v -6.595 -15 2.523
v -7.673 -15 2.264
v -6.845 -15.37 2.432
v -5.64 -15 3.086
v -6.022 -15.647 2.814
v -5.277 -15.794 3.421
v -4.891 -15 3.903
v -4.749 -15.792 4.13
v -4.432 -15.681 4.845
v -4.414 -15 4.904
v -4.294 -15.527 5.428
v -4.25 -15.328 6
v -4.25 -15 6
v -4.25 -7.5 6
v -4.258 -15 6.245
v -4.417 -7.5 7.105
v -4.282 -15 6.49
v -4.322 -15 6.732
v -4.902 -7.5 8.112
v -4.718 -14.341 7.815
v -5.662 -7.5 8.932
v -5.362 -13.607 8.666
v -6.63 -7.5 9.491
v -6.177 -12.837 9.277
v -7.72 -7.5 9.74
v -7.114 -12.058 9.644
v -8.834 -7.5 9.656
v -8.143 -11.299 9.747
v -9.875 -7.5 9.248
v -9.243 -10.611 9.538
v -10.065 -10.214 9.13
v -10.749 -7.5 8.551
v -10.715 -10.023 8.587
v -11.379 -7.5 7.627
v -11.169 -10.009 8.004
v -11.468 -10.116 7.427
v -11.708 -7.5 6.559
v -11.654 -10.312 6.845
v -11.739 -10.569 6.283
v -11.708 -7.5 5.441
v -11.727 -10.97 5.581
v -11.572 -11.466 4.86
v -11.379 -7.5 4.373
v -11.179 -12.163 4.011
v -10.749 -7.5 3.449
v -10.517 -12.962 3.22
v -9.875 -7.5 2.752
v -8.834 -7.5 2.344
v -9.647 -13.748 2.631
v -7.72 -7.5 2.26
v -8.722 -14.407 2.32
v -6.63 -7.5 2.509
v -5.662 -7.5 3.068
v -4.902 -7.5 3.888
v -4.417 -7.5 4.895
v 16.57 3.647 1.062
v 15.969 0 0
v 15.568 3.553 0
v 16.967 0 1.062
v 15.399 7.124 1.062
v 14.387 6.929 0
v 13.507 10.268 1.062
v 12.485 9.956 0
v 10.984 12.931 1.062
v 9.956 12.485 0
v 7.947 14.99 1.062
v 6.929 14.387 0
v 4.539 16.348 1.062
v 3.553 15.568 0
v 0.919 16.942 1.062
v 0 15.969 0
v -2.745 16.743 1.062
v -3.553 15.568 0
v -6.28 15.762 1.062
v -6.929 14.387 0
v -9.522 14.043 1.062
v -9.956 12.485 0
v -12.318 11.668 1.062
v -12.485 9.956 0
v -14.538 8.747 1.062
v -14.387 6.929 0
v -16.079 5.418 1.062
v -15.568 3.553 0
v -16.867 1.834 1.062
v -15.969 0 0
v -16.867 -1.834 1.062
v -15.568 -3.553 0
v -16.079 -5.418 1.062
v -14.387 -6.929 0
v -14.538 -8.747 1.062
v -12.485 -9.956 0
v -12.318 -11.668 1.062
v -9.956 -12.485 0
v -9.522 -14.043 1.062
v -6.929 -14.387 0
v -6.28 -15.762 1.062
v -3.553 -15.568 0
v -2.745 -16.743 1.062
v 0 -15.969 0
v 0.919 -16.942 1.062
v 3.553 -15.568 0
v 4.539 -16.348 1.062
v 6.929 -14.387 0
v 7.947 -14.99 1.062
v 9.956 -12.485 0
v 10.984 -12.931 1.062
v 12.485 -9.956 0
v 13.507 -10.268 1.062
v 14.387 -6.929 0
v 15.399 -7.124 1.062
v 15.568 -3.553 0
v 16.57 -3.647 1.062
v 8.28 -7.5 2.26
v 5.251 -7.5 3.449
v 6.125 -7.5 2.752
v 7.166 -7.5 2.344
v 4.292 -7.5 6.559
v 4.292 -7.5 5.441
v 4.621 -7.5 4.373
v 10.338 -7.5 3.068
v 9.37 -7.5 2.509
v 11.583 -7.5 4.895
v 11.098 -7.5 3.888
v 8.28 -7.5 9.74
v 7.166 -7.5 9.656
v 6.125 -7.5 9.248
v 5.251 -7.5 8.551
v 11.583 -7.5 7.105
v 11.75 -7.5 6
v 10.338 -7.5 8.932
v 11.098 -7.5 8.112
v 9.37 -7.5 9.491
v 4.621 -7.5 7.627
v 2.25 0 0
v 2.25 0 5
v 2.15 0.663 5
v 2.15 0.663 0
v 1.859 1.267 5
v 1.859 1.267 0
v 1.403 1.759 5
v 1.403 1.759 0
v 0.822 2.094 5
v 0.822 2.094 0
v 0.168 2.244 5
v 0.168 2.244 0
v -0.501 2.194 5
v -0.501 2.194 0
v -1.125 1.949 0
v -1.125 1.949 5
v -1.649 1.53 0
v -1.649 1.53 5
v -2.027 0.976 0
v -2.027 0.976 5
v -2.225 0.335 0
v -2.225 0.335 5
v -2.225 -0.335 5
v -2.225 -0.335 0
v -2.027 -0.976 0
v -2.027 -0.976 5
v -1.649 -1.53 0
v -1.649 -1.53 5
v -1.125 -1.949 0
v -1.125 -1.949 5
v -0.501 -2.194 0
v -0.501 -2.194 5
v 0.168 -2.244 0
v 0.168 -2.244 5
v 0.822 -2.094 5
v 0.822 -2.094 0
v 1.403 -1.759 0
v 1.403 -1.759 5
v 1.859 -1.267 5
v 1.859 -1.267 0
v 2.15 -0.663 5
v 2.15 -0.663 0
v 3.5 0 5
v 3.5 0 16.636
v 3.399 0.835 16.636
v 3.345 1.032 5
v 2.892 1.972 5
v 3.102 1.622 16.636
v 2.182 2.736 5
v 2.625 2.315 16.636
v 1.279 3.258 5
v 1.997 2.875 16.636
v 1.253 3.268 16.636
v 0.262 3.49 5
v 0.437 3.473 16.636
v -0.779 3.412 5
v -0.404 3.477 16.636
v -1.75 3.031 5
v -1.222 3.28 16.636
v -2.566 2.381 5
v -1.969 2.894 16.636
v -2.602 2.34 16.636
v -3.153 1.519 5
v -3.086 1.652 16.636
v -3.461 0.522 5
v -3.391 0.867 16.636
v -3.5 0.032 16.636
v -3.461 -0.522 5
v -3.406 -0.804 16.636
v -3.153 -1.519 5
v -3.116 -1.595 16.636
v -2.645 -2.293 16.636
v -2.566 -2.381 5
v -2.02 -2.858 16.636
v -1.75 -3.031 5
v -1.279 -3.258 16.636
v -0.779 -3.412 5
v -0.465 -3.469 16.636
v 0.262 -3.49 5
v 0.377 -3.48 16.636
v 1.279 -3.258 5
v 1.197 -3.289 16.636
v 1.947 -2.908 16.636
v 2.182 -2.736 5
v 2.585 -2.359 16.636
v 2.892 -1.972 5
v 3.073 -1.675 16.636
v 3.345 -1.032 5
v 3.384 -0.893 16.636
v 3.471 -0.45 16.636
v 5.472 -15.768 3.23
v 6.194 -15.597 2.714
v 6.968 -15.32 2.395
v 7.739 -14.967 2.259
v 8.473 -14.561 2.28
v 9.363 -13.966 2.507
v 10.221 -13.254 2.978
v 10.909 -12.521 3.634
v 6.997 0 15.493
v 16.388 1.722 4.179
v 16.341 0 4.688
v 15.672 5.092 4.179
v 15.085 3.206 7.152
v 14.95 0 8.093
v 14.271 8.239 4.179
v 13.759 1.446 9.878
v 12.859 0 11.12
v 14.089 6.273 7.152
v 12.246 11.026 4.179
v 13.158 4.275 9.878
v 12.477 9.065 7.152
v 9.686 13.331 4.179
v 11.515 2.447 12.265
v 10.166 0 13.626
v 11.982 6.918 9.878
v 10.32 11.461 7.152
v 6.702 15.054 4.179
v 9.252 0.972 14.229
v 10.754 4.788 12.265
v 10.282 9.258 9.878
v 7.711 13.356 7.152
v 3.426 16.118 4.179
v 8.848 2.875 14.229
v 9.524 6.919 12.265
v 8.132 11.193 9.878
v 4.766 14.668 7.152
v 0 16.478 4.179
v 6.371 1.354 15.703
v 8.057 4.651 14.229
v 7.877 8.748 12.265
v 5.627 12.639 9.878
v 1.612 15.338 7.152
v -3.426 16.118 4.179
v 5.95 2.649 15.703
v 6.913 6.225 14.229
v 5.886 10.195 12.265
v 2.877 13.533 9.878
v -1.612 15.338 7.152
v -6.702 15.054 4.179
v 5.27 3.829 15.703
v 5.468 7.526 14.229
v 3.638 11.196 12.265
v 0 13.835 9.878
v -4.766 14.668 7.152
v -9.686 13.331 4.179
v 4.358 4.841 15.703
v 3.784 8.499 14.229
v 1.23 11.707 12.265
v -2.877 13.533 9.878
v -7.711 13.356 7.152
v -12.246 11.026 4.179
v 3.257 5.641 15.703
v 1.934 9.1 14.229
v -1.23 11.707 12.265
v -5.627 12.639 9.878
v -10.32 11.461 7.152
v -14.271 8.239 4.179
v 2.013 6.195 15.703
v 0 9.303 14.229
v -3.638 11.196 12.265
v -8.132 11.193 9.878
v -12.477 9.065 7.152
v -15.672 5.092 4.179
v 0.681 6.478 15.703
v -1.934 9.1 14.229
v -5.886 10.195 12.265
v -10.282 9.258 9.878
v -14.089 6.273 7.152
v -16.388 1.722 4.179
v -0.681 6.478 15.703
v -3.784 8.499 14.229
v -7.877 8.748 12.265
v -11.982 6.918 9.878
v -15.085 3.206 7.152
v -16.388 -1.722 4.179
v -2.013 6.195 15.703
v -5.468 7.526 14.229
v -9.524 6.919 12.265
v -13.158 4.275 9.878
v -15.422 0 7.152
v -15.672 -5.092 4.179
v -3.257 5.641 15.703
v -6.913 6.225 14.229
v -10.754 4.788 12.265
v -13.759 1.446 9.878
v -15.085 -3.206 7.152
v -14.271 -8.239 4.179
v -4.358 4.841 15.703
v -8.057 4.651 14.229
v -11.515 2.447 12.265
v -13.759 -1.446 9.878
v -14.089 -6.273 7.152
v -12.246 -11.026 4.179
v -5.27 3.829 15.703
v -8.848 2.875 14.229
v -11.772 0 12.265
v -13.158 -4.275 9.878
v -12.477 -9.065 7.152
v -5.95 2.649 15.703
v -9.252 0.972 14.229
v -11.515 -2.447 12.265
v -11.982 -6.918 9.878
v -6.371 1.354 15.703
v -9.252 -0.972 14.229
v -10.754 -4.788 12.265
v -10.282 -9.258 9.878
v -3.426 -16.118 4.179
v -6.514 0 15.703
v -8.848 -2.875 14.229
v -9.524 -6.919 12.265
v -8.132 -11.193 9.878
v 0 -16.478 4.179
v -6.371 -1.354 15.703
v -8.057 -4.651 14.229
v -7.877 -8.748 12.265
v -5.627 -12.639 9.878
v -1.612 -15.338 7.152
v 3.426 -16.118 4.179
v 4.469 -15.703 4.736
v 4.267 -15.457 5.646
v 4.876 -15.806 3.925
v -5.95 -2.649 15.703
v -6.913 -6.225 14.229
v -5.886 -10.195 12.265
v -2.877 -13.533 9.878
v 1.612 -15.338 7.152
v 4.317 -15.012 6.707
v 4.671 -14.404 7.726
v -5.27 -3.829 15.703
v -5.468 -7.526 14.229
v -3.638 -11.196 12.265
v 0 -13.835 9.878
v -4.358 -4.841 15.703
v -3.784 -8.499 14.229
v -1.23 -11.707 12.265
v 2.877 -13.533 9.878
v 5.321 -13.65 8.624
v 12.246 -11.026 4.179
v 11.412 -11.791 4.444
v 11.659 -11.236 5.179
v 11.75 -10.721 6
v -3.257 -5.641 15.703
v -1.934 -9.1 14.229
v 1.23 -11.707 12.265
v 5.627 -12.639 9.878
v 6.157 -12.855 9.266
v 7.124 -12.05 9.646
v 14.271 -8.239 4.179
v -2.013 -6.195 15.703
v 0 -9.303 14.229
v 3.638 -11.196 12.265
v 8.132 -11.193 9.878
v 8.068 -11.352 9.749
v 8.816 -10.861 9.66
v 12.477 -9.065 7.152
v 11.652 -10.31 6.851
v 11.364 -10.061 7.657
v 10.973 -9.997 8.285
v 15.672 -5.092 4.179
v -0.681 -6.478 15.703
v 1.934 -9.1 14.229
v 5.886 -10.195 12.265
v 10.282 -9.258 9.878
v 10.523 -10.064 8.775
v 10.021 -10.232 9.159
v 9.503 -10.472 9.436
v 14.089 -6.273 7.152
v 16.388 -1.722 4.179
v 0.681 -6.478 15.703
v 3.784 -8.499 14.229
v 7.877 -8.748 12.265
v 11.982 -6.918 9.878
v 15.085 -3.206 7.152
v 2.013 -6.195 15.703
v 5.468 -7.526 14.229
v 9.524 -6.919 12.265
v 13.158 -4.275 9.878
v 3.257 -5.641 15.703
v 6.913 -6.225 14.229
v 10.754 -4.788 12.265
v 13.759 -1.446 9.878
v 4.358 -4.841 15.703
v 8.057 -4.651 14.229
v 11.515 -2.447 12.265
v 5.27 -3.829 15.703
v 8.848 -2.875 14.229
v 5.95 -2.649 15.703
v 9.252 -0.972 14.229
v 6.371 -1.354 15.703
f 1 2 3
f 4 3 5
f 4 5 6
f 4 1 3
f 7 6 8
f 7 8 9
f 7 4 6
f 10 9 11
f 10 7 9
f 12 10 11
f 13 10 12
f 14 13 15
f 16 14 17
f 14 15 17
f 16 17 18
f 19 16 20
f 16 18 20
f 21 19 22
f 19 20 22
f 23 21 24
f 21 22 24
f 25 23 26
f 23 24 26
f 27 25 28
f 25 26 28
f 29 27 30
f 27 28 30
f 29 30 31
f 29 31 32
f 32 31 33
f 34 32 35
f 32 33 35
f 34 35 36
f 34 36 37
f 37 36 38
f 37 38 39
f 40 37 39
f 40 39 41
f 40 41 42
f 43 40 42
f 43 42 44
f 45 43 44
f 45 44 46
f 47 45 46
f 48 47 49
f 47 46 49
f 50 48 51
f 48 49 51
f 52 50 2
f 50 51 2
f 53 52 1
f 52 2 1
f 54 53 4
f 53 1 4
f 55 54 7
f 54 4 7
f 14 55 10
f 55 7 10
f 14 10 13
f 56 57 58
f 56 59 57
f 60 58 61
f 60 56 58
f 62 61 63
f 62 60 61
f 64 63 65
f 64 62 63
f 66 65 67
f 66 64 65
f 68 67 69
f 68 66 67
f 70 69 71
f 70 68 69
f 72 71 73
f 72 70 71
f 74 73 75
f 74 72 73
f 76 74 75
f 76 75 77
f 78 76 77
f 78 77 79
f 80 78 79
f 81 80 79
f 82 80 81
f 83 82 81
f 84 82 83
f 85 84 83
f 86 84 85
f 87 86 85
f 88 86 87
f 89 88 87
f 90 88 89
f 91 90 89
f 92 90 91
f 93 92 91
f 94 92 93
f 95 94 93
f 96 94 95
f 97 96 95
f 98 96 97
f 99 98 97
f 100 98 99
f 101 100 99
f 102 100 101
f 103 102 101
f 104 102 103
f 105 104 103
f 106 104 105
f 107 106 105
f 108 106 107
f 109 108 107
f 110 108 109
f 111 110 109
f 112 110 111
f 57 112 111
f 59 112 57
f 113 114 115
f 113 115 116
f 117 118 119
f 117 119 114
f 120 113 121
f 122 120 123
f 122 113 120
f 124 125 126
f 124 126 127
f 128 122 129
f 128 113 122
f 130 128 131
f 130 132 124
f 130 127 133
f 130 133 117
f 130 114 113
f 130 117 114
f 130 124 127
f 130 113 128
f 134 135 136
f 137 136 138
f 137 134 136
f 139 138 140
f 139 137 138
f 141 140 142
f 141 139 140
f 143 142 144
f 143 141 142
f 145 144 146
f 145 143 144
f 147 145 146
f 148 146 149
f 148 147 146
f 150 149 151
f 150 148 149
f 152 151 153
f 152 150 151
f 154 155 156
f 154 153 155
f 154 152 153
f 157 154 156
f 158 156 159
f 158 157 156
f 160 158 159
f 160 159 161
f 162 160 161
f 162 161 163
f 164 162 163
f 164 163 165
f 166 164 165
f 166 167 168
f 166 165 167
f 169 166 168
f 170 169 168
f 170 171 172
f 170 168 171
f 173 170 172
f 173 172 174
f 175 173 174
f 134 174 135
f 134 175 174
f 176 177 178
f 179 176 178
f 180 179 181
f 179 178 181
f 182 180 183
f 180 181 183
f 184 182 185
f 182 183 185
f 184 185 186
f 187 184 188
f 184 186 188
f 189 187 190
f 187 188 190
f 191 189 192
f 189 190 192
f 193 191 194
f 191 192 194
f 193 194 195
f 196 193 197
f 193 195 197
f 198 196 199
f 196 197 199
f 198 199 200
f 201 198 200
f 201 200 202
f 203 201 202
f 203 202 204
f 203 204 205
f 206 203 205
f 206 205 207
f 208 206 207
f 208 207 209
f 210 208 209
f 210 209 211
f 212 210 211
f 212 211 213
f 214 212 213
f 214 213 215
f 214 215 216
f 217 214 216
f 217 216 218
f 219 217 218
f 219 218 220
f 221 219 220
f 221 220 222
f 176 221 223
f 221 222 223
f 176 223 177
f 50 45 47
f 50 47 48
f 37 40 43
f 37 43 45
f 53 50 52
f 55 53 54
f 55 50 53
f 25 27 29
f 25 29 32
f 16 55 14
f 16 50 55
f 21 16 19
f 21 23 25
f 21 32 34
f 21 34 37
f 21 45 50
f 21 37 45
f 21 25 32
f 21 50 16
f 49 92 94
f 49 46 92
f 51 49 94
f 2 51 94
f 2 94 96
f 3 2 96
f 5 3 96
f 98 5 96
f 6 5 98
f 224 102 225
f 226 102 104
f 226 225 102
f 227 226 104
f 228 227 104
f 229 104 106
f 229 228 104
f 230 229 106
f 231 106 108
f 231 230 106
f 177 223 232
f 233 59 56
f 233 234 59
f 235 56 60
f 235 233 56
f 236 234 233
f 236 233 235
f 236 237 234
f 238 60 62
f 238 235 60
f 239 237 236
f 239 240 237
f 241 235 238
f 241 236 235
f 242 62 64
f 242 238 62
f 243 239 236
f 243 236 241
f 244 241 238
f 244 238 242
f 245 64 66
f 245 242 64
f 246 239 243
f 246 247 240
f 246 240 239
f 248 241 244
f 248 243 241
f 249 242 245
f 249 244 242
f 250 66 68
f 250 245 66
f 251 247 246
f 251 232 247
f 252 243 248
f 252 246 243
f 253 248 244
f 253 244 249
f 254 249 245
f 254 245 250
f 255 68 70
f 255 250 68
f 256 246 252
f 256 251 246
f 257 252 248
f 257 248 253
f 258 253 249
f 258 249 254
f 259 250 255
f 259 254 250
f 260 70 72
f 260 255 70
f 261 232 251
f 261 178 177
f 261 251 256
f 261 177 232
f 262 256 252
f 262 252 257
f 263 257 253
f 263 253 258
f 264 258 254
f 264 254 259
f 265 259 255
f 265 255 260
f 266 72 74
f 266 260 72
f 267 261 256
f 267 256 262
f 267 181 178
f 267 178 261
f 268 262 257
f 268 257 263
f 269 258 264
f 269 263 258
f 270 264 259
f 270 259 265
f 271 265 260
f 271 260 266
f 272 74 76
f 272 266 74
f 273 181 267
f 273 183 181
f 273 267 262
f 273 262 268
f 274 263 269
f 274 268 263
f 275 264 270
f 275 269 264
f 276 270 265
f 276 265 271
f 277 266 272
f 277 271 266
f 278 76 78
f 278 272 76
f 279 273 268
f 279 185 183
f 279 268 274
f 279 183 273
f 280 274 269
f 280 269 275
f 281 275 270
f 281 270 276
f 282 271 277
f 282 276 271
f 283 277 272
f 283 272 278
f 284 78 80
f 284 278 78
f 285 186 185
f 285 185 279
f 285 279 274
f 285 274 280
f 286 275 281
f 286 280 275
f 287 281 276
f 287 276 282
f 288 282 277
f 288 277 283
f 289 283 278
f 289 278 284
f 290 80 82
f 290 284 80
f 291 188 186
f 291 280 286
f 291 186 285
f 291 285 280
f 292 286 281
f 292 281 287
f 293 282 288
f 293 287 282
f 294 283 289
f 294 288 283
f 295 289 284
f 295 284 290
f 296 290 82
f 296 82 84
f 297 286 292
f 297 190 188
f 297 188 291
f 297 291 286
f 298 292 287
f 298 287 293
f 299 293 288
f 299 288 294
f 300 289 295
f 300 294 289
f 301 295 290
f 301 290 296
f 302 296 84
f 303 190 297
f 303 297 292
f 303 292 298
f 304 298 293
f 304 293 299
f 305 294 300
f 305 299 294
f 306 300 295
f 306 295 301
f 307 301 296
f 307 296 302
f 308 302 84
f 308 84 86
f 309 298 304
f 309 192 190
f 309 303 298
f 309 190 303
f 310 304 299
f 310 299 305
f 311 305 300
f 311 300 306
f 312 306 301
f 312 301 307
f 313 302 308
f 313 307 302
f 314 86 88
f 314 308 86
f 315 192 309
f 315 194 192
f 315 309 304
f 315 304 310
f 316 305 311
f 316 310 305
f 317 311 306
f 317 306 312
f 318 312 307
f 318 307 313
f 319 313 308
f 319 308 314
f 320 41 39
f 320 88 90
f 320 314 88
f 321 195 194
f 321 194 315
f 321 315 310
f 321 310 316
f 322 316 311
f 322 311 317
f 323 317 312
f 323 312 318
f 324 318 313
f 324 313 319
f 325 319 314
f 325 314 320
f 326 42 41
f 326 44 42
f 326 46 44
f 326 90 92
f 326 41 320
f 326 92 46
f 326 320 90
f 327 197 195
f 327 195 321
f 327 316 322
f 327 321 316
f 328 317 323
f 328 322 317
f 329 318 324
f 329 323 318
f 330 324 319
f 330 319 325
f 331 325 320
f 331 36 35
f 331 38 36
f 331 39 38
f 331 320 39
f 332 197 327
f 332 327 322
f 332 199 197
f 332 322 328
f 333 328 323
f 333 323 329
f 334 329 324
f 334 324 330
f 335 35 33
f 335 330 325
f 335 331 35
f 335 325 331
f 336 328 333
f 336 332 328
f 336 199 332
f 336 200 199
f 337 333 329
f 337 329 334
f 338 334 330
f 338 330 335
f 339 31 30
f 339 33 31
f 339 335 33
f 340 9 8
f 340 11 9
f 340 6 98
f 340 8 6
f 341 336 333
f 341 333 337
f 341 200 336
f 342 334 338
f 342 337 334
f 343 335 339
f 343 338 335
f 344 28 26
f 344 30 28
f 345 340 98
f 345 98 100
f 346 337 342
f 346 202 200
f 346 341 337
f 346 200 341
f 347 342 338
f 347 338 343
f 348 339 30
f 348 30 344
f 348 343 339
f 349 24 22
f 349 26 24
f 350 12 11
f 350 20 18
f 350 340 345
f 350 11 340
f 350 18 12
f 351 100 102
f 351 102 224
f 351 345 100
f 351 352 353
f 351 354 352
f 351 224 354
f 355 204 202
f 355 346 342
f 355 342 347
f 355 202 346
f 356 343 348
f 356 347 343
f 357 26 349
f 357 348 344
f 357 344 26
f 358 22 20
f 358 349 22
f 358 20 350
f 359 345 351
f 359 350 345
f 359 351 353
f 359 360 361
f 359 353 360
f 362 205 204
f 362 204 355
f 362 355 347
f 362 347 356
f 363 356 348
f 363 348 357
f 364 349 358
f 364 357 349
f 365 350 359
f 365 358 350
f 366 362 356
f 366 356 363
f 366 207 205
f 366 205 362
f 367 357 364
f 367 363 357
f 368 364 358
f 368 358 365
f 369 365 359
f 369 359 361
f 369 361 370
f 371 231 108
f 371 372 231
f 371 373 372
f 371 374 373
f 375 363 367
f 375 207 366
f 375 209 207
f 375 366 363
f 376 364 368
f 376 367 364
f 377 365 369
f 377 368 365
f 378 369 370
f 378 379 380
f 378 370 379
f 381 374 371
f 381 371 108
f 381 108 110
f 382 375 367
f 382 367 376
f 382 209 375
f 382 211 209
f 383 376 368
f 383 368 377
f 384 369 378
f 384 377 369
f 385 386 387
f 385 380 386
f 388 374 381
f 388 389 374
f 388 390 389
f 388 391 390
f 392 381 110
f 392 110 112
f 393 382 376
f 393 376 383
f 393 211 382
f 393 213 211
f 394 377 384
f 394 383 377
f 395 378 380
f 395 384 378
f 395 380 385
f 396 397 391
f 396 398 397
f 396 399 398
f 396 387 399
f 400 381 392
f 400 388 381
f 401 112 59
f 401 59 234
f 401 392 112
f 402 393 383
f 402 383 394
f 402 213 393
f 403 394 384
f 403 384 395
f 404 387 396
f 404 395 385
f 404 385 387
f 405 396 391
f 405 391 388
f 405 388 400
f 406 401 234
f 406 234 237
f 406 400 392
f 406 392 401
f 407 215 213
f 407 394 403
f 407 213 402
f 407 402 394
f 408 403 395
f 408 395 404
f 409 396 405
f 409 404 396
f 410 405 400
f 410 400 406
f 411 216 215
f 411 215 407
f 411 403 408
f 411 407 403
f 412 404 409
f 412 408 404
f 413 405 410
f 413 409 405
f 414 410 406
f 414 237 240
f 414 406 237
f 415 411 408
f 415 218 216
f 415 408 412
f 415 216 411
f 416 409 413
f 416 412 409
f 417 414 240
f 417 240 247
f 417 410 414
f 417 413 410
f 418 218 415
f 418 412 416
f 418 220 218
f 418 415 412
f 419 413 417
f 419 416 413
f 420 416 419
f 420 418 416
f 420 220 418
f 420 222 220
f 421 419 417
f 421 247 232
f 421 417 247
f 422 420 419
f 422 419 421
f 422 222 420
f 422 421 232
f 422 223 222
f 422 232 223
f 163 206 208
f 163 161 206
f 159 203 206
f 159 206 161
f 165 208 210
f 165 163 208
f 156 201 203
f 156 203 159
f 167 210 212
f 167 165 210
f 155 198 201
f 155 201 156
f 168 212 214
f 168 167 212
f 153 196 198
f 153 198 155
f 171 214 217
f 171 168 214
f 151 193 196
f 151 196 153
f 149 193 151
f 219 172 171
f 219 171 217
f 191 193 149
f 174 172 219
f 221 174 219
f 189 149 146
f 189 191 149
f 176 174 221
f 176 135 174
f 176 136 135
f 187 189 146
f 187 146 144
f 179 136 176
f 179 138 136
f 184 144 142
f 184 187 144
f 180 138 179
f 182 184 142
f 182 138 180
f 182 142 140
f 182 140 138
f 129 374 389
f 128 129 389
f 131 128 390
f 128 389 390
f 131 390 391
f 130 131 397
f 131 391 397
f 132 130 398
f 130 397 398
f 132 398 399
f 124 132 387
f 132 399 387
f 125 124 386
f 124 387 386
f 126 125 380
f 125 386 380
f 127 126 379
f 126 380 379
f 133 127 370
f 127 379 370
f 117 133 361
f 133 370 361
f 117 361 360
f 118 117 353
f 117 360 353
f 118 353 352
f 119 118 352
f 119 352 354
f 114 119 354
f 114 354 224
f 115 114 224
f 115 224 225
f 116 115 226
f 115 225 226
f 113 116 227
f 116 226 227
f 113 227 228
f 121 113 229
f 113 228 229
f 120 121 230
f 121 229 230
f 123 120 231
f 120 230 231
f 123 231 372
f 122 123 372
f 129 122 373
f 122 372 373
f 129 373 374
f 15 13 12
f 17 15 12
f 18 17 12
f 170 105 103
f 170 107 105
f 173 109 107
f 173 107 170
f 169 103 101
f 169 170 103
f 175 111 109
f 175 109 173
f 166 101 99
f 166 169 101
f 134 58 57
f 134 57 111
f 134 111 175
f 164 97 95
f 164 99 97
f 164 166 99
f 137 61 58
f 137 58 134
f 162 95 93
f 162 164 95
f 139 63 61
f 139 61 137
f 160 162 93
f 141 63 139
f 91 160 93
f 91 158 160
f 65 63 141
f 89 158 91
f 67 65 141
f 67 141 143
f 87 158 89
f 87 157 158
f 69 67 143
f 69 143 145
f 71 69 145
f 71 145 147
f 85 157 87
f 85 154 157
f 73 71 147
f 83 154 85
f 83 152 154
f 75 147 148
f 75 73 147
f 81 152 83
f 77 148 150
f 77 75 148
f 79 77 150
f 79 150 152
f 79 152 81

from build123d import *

# Parameters (mm, degrees)
F3_R      = 3.75
F4_DEPTH  = 7.5
F6_R      = 2.25
F7_DEPTH  = 17.001
F9_R      = 3.5
F10_DEPTH = 25


# Not quite as in the source:
# - a fillet or chamfer that OpenCascade refuses, or shapes differently, is made with other operations: its cross-section is extruded or revolved along the edge and cut away or added


with BuildPart() as f1:
    # F0 (on Front) → F1 (revolve)
    with BuildSketch(Plane.XZ):
        with BuildLine():
            Line((0, 0), (17, 0))
            ThreePointArc((17, 0), (12.0208152802, 12.0208152802), (0, 17))
            Line((0, 17), (0, 0))
        make_face()
    revolve(axis=Axis((0, 0, 8.5), (0, 0, 1)))

    # F3 (on offset) → F4 (cut, symmetric)
    with BuildSketch(Plane.XZ.offset(15)):
        with Locations((-8, 6)):
            Circle(F3_R)
        with Locations((8, 6)):
            Circle(F3_R)
    extrude(amount=F4_DEPTH, both=True, mode=Mode.SUBTRACT)

    # F5: chamfer of 1 on 1 edges, made by hand

    # F5_s1 → F5_t2 (revolve, cut)
    with BuildSketch(Plane.XZ):
        with BuildLine():
            Line((15.9687194227, 0), (16.9667643866, 1.0625))
            ThreePointArc((16.9667643866, 1.0625), (16.9912411836, 0.54564003), (17, 0))
            Line((17, 0), (15.9687194227, 0))
        make_face()
    revolve(axis=Axis((0, 0, 0), (0, 0, 1)), mode=Mode.SUBTRACT)

    # F6 (on Top) → F7 (cut, through all)
    with BuildSketch(Plane.XY):
        Circle(F6_R)
    extrude(amount=F7_DEPTH, mode=Mode.SUBTRACT)

    # F9 (on offset) → F10 (cut)
    with BuildSketch(Plane.XY.offset(30)):
        Circle(F9_R)
    extrude(amount=-F10_DEPTH, mode=Mode.SUBTRACT)


solid = f1.part
